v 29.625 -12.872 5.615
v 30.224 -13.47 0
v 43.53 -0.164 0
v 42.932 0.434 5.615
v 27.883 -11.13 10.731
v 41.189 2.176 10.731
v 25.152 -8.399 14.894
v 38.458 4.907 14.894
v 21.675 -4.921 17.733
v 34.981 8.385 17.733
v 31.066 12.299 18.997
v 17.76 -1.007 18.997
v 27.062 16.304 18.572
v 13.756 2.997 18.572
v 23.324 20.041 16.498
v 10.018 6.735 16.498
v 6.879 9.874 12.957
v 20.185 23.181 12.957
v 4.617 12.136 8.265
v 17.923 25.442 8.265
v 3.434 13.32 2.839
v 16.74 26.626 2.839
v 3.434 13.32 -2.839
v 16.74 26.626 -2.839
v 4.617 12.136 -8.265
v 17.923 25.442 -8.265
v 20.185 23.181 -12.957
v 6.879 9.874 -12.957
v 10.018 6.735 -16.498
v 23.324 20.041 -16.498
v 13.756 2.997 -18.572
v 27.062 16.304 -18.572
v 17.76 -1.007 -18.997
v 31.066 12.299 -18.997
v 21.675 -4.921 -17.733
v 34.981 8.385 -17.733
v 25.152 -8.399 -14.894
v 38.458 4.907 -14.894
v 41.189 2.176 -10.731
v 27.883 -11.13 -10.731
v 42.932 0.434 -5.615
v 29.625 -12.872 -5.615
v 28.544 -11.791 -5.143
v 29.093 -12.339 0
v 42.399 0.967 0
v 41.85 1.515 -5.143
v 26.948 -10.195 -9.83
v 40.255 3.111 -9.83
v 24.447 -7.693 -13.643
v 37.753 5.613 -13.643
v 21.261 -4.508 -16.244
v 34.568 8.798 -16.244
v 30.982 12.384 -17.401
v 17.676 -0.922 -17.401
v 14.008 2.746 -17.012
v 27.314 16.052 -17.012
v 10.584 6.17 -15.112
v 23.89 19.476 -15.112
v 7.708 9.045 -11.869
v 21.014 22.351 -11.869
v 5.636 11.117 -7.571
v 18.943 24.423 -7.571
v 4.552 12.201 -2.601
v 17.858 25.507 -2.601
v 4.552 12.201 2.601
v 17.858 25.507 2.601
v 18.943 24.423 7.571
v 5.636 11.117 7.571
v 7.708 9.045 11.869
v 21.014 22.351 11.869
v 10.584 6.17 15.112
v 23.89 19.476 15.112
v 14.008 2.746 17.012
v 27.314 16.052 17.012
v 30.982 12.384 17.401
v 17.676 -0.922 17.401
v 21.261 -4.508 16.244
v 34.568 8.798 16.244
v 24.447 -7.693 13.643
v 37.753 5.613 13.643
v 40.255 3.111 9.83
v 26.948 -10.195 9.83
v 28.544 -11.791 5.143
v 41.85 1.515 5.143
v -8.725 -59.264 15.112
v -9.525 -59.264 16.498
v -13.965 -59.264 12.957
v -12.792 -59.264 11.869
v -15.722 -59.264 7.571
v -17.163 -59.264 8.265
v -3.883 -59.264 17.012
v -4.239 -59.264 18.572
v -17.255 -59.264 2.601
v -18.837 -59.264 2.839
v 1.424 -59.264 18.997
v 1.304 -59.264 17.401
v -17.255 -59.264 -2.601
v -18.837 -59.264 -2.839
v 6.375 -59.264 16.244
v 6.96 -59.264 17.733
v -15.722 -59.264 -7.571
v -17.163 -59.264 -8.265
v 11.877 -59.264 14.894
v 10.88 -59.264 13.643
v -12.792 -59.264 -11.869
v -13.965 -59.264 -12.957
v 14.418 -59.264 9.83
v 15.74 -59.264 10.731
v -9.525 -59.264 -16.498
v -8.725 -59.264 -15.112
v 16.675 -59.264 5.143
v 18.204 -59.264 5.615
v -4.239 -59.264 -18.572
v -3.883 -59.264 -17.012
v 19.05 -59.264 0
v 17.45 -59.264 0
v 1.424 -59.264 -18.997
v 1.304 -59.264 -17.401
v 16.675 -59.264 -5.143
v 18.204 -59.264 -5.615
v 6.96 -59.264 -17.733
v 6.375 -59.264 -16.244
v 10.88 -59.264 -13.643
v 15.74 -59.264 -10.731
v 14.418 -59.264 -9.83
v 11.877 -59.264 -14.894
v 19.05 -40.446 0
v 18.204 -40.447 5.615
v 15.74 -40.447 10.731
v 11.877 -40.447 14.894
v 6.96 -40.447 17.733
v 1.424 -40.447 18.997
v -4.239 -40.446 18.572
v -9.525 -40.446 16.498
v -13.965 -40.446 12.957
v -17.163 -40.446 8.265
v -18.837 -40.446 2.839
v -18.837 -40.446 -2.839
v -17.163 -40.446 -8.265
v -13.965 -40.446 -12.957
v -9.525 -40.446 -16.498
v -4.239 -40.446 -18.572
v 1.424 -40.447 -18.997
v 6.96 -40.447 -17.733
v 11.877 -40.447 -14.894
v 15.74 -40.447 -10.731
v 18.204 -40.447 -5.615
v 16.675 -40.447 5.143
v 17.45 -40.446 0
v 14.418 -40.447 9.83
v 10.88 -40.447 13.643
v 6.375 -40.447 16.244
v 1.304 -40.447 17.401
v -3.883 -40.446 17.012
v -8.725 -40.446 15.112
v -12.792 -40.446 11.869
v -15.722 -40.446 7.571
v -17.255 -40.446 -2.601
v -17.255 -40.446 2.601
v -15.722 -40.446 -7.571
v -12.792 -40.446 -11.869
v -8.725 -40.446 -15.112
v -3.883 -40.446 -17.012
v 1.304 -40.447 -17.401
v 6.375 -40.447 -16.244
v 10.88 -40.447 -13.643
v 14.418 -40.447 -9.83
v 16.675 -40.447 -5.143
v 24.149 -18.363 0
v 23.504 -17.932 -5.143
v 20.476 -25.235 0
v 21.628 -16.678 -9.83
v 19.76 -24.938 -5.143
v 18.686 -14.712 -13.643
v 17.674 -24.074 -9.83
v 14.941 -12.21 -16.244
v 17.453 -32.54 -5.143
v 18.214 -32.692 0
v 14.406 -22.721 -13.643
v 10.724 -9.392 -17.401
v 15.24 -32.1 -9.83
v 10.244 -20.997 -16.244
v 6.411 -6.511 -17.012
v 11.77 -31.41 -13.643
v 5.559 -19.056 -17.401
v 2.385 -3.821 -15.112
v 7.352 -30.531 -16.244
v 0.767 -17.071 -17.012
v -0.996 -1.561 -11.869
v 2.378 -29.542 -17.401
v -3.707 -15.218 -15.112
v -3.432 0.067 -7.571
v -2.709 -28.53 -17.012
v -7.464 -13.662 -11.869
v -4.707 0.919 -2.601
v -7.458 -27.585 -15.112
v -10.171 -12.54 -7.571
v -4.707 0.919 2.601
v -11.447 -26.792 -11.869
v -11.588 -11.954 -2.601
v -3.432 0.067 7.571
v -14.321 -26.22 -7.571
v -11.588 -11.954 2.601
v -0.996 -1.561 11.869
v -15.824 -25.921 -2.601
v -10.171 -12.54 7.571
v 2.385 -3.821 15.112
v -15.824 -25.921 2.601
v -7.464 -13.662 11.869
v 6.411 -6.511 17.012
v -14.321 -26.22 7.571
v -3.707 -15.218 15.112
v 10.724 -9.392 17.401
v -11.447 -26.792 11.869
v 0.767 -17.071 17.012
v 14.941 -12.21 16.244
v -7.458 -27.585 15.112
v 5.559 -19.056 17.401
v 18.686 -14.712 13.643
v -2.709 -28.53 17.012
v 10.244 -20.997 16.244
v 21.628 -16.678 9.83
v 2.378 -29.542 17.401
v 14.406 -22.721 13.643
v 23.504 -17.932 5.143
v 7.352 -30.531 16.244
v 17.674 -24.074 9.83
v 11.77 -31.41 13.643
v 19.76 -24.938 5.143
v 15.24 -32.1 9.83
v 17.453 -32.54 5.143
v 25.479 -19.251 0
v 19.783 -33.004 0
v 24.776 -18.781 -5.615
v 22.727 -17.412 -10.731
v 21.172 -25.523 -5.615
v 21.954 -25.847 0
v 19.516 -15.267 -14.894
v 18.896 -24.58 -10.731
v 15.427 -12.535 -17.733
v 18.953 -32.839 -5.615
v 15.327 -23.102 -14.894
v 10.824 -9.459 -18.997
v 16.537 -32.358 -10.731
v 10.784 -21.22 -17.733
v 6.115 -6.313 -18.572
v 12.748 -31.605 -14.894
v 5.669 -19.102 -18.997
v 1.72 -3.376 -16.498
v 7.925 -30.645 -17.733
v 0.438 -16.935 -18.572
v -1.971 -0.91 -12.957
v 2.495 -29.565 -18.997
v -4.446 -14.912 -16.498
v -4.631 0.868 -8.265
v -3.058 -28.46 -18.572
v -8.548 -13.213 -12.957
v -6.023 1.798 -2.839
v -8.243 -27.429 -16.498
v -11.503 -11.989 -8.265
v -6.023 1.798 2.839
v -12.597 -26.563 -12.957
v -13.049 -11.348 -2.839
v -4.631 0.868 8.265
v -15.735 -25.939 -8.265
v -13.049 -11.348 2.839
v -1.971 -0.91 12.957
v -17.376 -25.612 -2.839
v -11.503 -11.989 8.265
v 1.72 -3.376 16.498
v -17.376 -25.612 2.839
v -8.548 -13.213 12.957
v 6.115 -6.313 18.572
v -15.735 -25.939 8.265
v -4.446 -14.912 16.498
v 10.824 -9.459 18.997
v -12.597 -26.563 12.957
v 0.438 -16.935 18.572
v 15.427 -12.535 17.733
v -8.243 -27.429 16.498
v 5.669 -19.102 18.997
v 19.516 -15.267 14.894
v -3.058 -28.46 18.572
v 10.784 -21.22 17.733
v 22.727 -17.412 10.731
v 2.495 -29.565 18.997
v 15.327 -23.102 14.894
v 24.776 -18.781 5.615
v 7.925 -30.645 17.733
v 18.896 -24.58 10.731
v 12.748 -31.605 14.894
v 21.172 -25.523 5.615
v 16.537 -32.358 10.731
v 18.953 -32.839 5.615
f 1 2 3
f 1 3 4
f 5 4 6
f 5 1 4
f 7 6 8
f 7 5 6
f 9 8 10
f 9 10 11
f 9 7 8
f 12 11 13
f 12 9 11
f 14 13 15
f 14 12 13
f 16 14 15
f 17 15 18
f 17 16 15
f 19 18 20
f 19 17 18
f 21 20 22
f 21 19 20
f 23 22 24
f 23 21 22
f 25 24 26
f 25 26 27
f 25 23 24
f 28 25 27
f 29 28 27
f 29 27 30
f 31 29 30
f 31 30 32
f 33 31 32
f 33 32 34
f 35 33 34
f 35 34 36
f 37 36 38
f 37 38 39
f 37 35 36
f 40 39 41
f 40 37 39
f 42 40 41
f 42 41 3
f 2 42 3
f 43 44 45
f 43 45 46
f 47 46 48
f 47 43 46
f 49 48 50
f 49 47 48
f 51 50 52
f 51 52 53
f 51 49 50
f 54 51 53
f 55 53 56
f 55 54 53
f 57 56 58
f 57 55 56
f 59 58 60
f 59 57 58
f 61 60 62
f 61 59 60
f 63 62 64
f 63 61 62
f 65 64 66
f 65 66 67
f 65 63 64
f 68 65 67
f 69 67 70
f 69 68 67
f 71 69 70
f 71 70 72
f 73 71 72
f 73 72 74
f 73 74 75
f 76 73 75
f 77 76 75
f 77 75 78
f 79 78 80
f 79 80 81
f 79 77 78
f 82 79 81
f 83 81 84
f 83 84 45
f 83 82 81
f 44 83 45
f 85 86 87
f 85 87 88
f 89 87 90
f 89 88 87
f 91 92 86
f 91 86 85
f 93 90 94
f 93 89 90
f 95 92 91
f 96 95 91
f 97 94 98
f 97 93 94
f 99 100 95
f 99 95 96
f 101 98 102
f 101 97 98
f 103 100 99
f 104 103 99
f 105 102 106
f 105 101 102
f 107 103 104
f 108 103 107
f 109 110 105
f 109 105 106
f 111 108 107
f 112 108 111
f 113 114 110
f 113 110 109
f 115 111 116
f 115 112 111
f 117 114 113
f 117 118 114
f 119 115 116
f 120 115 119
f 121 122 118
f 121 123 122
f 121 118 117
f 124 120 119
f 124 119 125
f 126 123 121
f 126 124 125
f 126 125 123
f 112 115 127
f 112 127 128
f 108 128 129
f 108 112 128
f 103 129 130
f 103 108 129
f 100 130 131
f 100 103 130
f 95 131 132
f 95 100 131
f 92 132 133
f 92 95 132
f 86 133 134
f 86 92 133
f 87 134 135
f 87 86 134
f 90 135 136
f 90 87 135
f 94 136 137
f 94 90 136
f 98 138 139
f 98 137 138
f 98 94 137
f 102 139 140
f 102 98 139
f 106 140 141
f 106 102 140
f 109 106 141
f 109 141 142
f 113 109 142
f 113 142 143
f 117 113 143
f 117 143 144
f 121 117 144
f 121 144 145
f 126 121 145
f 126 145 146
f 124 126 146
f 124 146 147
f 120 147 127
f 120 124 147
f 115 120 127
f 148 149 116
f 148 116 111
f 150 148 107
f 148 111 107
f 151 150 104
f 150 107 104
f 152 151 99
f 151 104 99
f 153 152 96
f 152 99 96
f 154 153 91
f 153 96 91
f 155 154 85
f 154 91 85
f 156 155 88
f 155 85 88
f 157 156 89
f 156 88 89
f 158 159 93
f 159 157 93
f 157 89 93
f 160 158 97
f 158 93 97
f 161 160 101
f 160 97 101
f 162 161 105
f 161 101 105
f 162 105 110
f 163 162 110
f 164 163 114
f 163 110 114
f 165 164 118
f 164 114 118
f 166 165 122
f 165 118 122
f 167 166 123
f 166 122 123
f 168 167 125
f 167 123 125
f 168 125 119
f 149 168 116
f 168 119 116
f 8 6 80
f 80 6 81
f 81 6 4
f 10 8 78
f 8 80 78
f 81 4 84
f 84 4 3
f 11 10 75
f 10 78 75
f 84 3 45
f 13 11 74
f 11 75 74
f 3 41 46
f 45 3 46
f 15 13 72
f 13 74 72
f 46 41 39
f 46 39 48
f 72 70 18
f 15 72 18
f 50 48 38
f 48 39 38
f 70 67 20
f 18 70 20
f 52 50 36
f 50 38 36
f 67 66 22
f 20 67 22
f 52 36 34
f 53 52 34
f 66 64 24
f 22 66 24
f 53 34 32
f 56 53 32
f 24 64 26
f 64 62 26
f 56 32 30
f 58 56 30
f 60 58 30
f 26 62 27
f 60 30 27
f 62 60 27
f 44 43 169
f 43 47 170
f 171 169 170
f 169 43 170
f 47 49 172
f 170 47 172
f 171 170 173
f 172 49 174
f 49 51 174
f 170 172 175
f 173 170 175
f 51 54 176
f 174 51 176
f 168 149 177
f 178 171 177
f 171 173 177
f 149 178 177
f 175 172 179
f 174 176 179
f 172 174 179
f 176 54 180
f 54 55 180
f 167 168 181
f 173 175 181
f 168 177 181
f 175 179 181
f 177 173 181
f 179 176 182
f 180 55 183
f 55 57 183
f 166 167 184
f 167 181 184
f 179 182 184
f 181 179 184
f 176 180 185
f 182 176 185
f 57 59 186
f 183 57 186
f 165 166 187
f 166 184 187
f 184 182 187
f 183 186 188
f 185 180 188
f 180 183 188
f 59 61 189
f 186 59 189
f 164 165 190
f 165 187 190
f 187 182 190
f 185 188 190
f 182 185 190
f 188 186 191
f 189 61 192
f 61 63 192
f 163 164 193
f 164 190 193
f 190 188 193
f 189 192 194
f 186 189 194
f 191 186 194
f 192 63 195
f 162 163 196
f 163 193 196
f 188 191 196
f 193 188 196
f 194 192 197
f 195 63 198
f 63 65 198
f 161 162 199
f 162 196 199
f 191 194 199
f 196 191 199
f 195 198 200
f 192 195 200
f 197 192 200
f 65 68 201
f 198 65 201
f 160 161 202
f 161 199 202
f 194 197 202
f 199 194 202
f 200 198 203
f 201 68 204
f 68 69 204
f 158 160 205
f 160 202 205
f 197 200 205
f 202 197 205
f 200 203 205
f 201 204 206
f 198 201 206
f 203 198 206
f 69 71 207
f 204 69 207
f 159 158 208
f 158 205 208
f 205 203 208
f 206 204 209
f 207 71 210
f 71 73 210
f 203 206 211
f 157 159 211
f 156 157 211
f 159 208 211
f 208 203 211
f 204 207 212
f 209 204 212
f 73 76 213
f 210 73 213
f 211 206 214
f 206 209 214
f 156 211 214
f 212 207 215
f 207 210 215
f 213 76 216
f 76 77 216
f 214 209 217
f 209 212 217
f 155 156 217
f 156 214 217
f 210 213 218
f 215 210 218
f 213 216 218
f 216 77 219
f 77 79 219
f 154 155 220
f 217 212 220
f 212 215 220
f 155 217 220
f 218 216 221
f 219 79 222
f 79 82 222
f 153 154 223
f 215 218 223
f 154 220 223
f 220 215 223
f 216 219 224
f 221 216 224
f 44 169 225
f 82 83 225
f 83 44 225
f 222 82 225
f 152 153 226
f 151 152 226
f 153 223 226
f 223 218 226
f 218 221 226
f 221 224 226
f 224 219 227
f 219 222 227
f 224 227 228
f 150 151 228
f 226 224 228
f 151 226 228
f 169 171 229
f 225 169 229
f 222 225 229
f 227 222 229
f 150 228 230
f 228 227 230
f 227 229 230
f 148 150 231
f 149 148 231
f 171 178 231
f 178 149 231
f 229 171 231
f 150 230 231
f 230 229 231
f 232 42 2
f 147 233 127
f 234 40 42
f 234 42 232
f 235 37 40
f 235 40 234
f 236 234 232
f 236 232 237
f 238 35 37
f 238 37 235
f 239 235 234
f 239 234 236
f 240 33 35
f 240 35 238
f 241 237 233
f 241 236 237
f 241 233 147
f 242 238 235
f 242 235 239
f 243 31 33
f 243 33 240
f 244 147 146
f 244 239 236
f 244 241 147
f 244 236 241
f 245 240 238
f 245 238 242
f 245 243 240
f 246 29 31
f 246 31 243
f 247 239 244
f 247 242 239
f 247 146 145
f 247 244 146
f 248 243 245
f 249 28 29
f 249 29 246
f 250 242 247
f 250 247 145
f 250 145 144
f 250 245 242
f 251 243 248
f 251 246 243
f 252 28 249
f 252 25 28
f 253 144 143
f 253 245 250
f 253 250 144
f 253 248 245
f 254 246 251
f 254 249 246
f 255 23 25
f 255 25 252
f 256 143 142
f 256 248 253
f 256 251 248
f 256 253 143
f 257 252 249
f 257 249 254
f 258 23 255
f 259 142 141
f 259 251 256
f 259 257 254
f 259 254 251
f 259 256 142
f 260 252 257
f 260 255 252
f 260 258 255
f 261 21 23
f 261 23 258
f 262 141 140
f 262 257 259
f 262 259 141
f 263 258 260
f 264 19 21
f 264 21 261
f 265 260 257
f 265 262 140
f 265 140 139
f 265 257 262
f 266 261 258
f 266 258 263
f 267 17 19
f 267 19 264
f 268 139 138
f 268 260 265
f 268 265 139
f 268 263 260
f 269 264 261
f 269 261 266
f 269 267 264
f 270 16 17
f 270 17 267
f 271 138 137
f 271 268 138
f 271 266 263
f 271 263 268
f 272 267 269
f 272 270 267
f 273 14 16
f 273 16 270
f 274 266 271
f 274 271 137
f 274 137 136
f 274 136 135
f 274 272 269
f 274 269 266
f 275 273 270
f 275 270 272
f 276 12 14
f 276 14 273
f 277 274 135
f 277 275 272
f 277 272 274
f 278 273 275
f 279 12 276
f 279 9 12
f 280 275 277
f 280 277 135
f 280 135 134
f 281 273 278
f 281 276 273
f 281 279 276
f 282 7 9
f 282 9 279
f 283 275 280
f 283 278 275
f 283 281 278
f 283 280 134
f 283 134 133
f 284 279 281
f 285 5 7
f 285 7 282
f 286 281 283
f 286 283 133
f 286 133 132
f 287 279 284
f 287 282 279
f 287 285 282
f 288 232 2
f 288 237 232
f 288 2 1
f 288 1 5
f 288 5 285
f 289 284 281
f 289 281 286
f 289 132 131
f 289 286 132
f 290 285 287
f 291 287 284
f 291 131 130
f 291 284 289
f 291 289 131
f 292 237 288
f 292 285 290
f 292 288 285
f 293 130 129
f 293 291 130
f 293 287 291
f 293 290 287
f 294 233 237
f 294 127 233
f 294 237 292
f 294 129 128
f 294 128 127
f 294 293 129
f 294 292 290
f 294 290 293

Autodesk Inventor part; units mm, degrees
ref_plane "YZ Plane" through (0, 0, 0) normal (1, 0, 0) x (0, 1, 0)
ref_plane "XZ Plane" through (0, 0, 0) normal (0, 1, 0) x (-1, 0, 0)
sketch "Szkic6" plane through (0, 0, 0) normal (0, 0, 1) x (1, 0, 0)
  line L0 (-29.6067, 0) -> (35.2678, 0) construction
  line L1 (0, 42.3419) -> (0, -58.3726) construction
  arc A0 (16.7535, 0) -> (0, -40.4465) centre (57.2, -40.4465) ccw
  line L2 (0, -40.4465) -> (57.2, -40.4465) construction
  line L3 (57.2, -40.4465) -> (10.8611, 5.8924) construction
  line L4 (16.7535, 0) -> (30.0596, 13.3061)
  line L5 (0, -40.4465) -> (0, -59.2641)
  point P0 (0, 0)
  dimension "d24" = 57.2
  dimension "d31" = 45
  dimension "d36" = 18.8176
  dimension "d37" = 18.8176
ref_plane "Płaszczyzna konstrukcyjna2" through (0, -40.4465, 0) normal (0, -1, 0) x (1, 0, 0)
sketch "Szkic8" plane through (0, -40.4465, 0) normal (0, -1, 0) x (1, 0, 0)
  circle A0 centre (0, 0) radius 19.05
  circle A1 centre (0, 0) radius 17.45
  dimension "d32" = 38.1
  dimension "d33" = 1.6
sweep "Przeciągnięcie2" add profiles "Szkic8" path "Szkic6"
equation "\"d32\" = OD"
equation "\"d33\" = THK"
equation "\"d24\" = R"
equation "\"d31\" = KAT"
equation "\"d36\" = PROSTKA"
equation "\"d37\" = PROSTKA"
equation "\"SzerokośćGięciaPodcięcia\" = Grubość"
equation "\"RozmiarPodcięciaNarożnika\" = 4 * Grubość"
equation "\"PromieńPrzejścia\" = PromieńGięcia"
equation "\"Rozmiar_promienia_Jacobiego\" = PromieńGięcia"
equation "\"Wielk_odstępu\" = Grubość"
equation "\"d2\" = PromieńGięcia"
equation "\"d23\" = PromieńGięcia"
equation "\"R\" = 57.2"
equation "\"OD\" = 38.1"
equation "\"THK\" = 1.6"
equation "\"KAT\" = 45deg"
equation "\"PROSTKA\" = 18.81761"
equation "\"Grubość\" = 1.5"
equation "\"PromieńGięcia\" = 3"
properties part number "Kolano 45° ø38,1x1,6 R57,2" material "304L"
